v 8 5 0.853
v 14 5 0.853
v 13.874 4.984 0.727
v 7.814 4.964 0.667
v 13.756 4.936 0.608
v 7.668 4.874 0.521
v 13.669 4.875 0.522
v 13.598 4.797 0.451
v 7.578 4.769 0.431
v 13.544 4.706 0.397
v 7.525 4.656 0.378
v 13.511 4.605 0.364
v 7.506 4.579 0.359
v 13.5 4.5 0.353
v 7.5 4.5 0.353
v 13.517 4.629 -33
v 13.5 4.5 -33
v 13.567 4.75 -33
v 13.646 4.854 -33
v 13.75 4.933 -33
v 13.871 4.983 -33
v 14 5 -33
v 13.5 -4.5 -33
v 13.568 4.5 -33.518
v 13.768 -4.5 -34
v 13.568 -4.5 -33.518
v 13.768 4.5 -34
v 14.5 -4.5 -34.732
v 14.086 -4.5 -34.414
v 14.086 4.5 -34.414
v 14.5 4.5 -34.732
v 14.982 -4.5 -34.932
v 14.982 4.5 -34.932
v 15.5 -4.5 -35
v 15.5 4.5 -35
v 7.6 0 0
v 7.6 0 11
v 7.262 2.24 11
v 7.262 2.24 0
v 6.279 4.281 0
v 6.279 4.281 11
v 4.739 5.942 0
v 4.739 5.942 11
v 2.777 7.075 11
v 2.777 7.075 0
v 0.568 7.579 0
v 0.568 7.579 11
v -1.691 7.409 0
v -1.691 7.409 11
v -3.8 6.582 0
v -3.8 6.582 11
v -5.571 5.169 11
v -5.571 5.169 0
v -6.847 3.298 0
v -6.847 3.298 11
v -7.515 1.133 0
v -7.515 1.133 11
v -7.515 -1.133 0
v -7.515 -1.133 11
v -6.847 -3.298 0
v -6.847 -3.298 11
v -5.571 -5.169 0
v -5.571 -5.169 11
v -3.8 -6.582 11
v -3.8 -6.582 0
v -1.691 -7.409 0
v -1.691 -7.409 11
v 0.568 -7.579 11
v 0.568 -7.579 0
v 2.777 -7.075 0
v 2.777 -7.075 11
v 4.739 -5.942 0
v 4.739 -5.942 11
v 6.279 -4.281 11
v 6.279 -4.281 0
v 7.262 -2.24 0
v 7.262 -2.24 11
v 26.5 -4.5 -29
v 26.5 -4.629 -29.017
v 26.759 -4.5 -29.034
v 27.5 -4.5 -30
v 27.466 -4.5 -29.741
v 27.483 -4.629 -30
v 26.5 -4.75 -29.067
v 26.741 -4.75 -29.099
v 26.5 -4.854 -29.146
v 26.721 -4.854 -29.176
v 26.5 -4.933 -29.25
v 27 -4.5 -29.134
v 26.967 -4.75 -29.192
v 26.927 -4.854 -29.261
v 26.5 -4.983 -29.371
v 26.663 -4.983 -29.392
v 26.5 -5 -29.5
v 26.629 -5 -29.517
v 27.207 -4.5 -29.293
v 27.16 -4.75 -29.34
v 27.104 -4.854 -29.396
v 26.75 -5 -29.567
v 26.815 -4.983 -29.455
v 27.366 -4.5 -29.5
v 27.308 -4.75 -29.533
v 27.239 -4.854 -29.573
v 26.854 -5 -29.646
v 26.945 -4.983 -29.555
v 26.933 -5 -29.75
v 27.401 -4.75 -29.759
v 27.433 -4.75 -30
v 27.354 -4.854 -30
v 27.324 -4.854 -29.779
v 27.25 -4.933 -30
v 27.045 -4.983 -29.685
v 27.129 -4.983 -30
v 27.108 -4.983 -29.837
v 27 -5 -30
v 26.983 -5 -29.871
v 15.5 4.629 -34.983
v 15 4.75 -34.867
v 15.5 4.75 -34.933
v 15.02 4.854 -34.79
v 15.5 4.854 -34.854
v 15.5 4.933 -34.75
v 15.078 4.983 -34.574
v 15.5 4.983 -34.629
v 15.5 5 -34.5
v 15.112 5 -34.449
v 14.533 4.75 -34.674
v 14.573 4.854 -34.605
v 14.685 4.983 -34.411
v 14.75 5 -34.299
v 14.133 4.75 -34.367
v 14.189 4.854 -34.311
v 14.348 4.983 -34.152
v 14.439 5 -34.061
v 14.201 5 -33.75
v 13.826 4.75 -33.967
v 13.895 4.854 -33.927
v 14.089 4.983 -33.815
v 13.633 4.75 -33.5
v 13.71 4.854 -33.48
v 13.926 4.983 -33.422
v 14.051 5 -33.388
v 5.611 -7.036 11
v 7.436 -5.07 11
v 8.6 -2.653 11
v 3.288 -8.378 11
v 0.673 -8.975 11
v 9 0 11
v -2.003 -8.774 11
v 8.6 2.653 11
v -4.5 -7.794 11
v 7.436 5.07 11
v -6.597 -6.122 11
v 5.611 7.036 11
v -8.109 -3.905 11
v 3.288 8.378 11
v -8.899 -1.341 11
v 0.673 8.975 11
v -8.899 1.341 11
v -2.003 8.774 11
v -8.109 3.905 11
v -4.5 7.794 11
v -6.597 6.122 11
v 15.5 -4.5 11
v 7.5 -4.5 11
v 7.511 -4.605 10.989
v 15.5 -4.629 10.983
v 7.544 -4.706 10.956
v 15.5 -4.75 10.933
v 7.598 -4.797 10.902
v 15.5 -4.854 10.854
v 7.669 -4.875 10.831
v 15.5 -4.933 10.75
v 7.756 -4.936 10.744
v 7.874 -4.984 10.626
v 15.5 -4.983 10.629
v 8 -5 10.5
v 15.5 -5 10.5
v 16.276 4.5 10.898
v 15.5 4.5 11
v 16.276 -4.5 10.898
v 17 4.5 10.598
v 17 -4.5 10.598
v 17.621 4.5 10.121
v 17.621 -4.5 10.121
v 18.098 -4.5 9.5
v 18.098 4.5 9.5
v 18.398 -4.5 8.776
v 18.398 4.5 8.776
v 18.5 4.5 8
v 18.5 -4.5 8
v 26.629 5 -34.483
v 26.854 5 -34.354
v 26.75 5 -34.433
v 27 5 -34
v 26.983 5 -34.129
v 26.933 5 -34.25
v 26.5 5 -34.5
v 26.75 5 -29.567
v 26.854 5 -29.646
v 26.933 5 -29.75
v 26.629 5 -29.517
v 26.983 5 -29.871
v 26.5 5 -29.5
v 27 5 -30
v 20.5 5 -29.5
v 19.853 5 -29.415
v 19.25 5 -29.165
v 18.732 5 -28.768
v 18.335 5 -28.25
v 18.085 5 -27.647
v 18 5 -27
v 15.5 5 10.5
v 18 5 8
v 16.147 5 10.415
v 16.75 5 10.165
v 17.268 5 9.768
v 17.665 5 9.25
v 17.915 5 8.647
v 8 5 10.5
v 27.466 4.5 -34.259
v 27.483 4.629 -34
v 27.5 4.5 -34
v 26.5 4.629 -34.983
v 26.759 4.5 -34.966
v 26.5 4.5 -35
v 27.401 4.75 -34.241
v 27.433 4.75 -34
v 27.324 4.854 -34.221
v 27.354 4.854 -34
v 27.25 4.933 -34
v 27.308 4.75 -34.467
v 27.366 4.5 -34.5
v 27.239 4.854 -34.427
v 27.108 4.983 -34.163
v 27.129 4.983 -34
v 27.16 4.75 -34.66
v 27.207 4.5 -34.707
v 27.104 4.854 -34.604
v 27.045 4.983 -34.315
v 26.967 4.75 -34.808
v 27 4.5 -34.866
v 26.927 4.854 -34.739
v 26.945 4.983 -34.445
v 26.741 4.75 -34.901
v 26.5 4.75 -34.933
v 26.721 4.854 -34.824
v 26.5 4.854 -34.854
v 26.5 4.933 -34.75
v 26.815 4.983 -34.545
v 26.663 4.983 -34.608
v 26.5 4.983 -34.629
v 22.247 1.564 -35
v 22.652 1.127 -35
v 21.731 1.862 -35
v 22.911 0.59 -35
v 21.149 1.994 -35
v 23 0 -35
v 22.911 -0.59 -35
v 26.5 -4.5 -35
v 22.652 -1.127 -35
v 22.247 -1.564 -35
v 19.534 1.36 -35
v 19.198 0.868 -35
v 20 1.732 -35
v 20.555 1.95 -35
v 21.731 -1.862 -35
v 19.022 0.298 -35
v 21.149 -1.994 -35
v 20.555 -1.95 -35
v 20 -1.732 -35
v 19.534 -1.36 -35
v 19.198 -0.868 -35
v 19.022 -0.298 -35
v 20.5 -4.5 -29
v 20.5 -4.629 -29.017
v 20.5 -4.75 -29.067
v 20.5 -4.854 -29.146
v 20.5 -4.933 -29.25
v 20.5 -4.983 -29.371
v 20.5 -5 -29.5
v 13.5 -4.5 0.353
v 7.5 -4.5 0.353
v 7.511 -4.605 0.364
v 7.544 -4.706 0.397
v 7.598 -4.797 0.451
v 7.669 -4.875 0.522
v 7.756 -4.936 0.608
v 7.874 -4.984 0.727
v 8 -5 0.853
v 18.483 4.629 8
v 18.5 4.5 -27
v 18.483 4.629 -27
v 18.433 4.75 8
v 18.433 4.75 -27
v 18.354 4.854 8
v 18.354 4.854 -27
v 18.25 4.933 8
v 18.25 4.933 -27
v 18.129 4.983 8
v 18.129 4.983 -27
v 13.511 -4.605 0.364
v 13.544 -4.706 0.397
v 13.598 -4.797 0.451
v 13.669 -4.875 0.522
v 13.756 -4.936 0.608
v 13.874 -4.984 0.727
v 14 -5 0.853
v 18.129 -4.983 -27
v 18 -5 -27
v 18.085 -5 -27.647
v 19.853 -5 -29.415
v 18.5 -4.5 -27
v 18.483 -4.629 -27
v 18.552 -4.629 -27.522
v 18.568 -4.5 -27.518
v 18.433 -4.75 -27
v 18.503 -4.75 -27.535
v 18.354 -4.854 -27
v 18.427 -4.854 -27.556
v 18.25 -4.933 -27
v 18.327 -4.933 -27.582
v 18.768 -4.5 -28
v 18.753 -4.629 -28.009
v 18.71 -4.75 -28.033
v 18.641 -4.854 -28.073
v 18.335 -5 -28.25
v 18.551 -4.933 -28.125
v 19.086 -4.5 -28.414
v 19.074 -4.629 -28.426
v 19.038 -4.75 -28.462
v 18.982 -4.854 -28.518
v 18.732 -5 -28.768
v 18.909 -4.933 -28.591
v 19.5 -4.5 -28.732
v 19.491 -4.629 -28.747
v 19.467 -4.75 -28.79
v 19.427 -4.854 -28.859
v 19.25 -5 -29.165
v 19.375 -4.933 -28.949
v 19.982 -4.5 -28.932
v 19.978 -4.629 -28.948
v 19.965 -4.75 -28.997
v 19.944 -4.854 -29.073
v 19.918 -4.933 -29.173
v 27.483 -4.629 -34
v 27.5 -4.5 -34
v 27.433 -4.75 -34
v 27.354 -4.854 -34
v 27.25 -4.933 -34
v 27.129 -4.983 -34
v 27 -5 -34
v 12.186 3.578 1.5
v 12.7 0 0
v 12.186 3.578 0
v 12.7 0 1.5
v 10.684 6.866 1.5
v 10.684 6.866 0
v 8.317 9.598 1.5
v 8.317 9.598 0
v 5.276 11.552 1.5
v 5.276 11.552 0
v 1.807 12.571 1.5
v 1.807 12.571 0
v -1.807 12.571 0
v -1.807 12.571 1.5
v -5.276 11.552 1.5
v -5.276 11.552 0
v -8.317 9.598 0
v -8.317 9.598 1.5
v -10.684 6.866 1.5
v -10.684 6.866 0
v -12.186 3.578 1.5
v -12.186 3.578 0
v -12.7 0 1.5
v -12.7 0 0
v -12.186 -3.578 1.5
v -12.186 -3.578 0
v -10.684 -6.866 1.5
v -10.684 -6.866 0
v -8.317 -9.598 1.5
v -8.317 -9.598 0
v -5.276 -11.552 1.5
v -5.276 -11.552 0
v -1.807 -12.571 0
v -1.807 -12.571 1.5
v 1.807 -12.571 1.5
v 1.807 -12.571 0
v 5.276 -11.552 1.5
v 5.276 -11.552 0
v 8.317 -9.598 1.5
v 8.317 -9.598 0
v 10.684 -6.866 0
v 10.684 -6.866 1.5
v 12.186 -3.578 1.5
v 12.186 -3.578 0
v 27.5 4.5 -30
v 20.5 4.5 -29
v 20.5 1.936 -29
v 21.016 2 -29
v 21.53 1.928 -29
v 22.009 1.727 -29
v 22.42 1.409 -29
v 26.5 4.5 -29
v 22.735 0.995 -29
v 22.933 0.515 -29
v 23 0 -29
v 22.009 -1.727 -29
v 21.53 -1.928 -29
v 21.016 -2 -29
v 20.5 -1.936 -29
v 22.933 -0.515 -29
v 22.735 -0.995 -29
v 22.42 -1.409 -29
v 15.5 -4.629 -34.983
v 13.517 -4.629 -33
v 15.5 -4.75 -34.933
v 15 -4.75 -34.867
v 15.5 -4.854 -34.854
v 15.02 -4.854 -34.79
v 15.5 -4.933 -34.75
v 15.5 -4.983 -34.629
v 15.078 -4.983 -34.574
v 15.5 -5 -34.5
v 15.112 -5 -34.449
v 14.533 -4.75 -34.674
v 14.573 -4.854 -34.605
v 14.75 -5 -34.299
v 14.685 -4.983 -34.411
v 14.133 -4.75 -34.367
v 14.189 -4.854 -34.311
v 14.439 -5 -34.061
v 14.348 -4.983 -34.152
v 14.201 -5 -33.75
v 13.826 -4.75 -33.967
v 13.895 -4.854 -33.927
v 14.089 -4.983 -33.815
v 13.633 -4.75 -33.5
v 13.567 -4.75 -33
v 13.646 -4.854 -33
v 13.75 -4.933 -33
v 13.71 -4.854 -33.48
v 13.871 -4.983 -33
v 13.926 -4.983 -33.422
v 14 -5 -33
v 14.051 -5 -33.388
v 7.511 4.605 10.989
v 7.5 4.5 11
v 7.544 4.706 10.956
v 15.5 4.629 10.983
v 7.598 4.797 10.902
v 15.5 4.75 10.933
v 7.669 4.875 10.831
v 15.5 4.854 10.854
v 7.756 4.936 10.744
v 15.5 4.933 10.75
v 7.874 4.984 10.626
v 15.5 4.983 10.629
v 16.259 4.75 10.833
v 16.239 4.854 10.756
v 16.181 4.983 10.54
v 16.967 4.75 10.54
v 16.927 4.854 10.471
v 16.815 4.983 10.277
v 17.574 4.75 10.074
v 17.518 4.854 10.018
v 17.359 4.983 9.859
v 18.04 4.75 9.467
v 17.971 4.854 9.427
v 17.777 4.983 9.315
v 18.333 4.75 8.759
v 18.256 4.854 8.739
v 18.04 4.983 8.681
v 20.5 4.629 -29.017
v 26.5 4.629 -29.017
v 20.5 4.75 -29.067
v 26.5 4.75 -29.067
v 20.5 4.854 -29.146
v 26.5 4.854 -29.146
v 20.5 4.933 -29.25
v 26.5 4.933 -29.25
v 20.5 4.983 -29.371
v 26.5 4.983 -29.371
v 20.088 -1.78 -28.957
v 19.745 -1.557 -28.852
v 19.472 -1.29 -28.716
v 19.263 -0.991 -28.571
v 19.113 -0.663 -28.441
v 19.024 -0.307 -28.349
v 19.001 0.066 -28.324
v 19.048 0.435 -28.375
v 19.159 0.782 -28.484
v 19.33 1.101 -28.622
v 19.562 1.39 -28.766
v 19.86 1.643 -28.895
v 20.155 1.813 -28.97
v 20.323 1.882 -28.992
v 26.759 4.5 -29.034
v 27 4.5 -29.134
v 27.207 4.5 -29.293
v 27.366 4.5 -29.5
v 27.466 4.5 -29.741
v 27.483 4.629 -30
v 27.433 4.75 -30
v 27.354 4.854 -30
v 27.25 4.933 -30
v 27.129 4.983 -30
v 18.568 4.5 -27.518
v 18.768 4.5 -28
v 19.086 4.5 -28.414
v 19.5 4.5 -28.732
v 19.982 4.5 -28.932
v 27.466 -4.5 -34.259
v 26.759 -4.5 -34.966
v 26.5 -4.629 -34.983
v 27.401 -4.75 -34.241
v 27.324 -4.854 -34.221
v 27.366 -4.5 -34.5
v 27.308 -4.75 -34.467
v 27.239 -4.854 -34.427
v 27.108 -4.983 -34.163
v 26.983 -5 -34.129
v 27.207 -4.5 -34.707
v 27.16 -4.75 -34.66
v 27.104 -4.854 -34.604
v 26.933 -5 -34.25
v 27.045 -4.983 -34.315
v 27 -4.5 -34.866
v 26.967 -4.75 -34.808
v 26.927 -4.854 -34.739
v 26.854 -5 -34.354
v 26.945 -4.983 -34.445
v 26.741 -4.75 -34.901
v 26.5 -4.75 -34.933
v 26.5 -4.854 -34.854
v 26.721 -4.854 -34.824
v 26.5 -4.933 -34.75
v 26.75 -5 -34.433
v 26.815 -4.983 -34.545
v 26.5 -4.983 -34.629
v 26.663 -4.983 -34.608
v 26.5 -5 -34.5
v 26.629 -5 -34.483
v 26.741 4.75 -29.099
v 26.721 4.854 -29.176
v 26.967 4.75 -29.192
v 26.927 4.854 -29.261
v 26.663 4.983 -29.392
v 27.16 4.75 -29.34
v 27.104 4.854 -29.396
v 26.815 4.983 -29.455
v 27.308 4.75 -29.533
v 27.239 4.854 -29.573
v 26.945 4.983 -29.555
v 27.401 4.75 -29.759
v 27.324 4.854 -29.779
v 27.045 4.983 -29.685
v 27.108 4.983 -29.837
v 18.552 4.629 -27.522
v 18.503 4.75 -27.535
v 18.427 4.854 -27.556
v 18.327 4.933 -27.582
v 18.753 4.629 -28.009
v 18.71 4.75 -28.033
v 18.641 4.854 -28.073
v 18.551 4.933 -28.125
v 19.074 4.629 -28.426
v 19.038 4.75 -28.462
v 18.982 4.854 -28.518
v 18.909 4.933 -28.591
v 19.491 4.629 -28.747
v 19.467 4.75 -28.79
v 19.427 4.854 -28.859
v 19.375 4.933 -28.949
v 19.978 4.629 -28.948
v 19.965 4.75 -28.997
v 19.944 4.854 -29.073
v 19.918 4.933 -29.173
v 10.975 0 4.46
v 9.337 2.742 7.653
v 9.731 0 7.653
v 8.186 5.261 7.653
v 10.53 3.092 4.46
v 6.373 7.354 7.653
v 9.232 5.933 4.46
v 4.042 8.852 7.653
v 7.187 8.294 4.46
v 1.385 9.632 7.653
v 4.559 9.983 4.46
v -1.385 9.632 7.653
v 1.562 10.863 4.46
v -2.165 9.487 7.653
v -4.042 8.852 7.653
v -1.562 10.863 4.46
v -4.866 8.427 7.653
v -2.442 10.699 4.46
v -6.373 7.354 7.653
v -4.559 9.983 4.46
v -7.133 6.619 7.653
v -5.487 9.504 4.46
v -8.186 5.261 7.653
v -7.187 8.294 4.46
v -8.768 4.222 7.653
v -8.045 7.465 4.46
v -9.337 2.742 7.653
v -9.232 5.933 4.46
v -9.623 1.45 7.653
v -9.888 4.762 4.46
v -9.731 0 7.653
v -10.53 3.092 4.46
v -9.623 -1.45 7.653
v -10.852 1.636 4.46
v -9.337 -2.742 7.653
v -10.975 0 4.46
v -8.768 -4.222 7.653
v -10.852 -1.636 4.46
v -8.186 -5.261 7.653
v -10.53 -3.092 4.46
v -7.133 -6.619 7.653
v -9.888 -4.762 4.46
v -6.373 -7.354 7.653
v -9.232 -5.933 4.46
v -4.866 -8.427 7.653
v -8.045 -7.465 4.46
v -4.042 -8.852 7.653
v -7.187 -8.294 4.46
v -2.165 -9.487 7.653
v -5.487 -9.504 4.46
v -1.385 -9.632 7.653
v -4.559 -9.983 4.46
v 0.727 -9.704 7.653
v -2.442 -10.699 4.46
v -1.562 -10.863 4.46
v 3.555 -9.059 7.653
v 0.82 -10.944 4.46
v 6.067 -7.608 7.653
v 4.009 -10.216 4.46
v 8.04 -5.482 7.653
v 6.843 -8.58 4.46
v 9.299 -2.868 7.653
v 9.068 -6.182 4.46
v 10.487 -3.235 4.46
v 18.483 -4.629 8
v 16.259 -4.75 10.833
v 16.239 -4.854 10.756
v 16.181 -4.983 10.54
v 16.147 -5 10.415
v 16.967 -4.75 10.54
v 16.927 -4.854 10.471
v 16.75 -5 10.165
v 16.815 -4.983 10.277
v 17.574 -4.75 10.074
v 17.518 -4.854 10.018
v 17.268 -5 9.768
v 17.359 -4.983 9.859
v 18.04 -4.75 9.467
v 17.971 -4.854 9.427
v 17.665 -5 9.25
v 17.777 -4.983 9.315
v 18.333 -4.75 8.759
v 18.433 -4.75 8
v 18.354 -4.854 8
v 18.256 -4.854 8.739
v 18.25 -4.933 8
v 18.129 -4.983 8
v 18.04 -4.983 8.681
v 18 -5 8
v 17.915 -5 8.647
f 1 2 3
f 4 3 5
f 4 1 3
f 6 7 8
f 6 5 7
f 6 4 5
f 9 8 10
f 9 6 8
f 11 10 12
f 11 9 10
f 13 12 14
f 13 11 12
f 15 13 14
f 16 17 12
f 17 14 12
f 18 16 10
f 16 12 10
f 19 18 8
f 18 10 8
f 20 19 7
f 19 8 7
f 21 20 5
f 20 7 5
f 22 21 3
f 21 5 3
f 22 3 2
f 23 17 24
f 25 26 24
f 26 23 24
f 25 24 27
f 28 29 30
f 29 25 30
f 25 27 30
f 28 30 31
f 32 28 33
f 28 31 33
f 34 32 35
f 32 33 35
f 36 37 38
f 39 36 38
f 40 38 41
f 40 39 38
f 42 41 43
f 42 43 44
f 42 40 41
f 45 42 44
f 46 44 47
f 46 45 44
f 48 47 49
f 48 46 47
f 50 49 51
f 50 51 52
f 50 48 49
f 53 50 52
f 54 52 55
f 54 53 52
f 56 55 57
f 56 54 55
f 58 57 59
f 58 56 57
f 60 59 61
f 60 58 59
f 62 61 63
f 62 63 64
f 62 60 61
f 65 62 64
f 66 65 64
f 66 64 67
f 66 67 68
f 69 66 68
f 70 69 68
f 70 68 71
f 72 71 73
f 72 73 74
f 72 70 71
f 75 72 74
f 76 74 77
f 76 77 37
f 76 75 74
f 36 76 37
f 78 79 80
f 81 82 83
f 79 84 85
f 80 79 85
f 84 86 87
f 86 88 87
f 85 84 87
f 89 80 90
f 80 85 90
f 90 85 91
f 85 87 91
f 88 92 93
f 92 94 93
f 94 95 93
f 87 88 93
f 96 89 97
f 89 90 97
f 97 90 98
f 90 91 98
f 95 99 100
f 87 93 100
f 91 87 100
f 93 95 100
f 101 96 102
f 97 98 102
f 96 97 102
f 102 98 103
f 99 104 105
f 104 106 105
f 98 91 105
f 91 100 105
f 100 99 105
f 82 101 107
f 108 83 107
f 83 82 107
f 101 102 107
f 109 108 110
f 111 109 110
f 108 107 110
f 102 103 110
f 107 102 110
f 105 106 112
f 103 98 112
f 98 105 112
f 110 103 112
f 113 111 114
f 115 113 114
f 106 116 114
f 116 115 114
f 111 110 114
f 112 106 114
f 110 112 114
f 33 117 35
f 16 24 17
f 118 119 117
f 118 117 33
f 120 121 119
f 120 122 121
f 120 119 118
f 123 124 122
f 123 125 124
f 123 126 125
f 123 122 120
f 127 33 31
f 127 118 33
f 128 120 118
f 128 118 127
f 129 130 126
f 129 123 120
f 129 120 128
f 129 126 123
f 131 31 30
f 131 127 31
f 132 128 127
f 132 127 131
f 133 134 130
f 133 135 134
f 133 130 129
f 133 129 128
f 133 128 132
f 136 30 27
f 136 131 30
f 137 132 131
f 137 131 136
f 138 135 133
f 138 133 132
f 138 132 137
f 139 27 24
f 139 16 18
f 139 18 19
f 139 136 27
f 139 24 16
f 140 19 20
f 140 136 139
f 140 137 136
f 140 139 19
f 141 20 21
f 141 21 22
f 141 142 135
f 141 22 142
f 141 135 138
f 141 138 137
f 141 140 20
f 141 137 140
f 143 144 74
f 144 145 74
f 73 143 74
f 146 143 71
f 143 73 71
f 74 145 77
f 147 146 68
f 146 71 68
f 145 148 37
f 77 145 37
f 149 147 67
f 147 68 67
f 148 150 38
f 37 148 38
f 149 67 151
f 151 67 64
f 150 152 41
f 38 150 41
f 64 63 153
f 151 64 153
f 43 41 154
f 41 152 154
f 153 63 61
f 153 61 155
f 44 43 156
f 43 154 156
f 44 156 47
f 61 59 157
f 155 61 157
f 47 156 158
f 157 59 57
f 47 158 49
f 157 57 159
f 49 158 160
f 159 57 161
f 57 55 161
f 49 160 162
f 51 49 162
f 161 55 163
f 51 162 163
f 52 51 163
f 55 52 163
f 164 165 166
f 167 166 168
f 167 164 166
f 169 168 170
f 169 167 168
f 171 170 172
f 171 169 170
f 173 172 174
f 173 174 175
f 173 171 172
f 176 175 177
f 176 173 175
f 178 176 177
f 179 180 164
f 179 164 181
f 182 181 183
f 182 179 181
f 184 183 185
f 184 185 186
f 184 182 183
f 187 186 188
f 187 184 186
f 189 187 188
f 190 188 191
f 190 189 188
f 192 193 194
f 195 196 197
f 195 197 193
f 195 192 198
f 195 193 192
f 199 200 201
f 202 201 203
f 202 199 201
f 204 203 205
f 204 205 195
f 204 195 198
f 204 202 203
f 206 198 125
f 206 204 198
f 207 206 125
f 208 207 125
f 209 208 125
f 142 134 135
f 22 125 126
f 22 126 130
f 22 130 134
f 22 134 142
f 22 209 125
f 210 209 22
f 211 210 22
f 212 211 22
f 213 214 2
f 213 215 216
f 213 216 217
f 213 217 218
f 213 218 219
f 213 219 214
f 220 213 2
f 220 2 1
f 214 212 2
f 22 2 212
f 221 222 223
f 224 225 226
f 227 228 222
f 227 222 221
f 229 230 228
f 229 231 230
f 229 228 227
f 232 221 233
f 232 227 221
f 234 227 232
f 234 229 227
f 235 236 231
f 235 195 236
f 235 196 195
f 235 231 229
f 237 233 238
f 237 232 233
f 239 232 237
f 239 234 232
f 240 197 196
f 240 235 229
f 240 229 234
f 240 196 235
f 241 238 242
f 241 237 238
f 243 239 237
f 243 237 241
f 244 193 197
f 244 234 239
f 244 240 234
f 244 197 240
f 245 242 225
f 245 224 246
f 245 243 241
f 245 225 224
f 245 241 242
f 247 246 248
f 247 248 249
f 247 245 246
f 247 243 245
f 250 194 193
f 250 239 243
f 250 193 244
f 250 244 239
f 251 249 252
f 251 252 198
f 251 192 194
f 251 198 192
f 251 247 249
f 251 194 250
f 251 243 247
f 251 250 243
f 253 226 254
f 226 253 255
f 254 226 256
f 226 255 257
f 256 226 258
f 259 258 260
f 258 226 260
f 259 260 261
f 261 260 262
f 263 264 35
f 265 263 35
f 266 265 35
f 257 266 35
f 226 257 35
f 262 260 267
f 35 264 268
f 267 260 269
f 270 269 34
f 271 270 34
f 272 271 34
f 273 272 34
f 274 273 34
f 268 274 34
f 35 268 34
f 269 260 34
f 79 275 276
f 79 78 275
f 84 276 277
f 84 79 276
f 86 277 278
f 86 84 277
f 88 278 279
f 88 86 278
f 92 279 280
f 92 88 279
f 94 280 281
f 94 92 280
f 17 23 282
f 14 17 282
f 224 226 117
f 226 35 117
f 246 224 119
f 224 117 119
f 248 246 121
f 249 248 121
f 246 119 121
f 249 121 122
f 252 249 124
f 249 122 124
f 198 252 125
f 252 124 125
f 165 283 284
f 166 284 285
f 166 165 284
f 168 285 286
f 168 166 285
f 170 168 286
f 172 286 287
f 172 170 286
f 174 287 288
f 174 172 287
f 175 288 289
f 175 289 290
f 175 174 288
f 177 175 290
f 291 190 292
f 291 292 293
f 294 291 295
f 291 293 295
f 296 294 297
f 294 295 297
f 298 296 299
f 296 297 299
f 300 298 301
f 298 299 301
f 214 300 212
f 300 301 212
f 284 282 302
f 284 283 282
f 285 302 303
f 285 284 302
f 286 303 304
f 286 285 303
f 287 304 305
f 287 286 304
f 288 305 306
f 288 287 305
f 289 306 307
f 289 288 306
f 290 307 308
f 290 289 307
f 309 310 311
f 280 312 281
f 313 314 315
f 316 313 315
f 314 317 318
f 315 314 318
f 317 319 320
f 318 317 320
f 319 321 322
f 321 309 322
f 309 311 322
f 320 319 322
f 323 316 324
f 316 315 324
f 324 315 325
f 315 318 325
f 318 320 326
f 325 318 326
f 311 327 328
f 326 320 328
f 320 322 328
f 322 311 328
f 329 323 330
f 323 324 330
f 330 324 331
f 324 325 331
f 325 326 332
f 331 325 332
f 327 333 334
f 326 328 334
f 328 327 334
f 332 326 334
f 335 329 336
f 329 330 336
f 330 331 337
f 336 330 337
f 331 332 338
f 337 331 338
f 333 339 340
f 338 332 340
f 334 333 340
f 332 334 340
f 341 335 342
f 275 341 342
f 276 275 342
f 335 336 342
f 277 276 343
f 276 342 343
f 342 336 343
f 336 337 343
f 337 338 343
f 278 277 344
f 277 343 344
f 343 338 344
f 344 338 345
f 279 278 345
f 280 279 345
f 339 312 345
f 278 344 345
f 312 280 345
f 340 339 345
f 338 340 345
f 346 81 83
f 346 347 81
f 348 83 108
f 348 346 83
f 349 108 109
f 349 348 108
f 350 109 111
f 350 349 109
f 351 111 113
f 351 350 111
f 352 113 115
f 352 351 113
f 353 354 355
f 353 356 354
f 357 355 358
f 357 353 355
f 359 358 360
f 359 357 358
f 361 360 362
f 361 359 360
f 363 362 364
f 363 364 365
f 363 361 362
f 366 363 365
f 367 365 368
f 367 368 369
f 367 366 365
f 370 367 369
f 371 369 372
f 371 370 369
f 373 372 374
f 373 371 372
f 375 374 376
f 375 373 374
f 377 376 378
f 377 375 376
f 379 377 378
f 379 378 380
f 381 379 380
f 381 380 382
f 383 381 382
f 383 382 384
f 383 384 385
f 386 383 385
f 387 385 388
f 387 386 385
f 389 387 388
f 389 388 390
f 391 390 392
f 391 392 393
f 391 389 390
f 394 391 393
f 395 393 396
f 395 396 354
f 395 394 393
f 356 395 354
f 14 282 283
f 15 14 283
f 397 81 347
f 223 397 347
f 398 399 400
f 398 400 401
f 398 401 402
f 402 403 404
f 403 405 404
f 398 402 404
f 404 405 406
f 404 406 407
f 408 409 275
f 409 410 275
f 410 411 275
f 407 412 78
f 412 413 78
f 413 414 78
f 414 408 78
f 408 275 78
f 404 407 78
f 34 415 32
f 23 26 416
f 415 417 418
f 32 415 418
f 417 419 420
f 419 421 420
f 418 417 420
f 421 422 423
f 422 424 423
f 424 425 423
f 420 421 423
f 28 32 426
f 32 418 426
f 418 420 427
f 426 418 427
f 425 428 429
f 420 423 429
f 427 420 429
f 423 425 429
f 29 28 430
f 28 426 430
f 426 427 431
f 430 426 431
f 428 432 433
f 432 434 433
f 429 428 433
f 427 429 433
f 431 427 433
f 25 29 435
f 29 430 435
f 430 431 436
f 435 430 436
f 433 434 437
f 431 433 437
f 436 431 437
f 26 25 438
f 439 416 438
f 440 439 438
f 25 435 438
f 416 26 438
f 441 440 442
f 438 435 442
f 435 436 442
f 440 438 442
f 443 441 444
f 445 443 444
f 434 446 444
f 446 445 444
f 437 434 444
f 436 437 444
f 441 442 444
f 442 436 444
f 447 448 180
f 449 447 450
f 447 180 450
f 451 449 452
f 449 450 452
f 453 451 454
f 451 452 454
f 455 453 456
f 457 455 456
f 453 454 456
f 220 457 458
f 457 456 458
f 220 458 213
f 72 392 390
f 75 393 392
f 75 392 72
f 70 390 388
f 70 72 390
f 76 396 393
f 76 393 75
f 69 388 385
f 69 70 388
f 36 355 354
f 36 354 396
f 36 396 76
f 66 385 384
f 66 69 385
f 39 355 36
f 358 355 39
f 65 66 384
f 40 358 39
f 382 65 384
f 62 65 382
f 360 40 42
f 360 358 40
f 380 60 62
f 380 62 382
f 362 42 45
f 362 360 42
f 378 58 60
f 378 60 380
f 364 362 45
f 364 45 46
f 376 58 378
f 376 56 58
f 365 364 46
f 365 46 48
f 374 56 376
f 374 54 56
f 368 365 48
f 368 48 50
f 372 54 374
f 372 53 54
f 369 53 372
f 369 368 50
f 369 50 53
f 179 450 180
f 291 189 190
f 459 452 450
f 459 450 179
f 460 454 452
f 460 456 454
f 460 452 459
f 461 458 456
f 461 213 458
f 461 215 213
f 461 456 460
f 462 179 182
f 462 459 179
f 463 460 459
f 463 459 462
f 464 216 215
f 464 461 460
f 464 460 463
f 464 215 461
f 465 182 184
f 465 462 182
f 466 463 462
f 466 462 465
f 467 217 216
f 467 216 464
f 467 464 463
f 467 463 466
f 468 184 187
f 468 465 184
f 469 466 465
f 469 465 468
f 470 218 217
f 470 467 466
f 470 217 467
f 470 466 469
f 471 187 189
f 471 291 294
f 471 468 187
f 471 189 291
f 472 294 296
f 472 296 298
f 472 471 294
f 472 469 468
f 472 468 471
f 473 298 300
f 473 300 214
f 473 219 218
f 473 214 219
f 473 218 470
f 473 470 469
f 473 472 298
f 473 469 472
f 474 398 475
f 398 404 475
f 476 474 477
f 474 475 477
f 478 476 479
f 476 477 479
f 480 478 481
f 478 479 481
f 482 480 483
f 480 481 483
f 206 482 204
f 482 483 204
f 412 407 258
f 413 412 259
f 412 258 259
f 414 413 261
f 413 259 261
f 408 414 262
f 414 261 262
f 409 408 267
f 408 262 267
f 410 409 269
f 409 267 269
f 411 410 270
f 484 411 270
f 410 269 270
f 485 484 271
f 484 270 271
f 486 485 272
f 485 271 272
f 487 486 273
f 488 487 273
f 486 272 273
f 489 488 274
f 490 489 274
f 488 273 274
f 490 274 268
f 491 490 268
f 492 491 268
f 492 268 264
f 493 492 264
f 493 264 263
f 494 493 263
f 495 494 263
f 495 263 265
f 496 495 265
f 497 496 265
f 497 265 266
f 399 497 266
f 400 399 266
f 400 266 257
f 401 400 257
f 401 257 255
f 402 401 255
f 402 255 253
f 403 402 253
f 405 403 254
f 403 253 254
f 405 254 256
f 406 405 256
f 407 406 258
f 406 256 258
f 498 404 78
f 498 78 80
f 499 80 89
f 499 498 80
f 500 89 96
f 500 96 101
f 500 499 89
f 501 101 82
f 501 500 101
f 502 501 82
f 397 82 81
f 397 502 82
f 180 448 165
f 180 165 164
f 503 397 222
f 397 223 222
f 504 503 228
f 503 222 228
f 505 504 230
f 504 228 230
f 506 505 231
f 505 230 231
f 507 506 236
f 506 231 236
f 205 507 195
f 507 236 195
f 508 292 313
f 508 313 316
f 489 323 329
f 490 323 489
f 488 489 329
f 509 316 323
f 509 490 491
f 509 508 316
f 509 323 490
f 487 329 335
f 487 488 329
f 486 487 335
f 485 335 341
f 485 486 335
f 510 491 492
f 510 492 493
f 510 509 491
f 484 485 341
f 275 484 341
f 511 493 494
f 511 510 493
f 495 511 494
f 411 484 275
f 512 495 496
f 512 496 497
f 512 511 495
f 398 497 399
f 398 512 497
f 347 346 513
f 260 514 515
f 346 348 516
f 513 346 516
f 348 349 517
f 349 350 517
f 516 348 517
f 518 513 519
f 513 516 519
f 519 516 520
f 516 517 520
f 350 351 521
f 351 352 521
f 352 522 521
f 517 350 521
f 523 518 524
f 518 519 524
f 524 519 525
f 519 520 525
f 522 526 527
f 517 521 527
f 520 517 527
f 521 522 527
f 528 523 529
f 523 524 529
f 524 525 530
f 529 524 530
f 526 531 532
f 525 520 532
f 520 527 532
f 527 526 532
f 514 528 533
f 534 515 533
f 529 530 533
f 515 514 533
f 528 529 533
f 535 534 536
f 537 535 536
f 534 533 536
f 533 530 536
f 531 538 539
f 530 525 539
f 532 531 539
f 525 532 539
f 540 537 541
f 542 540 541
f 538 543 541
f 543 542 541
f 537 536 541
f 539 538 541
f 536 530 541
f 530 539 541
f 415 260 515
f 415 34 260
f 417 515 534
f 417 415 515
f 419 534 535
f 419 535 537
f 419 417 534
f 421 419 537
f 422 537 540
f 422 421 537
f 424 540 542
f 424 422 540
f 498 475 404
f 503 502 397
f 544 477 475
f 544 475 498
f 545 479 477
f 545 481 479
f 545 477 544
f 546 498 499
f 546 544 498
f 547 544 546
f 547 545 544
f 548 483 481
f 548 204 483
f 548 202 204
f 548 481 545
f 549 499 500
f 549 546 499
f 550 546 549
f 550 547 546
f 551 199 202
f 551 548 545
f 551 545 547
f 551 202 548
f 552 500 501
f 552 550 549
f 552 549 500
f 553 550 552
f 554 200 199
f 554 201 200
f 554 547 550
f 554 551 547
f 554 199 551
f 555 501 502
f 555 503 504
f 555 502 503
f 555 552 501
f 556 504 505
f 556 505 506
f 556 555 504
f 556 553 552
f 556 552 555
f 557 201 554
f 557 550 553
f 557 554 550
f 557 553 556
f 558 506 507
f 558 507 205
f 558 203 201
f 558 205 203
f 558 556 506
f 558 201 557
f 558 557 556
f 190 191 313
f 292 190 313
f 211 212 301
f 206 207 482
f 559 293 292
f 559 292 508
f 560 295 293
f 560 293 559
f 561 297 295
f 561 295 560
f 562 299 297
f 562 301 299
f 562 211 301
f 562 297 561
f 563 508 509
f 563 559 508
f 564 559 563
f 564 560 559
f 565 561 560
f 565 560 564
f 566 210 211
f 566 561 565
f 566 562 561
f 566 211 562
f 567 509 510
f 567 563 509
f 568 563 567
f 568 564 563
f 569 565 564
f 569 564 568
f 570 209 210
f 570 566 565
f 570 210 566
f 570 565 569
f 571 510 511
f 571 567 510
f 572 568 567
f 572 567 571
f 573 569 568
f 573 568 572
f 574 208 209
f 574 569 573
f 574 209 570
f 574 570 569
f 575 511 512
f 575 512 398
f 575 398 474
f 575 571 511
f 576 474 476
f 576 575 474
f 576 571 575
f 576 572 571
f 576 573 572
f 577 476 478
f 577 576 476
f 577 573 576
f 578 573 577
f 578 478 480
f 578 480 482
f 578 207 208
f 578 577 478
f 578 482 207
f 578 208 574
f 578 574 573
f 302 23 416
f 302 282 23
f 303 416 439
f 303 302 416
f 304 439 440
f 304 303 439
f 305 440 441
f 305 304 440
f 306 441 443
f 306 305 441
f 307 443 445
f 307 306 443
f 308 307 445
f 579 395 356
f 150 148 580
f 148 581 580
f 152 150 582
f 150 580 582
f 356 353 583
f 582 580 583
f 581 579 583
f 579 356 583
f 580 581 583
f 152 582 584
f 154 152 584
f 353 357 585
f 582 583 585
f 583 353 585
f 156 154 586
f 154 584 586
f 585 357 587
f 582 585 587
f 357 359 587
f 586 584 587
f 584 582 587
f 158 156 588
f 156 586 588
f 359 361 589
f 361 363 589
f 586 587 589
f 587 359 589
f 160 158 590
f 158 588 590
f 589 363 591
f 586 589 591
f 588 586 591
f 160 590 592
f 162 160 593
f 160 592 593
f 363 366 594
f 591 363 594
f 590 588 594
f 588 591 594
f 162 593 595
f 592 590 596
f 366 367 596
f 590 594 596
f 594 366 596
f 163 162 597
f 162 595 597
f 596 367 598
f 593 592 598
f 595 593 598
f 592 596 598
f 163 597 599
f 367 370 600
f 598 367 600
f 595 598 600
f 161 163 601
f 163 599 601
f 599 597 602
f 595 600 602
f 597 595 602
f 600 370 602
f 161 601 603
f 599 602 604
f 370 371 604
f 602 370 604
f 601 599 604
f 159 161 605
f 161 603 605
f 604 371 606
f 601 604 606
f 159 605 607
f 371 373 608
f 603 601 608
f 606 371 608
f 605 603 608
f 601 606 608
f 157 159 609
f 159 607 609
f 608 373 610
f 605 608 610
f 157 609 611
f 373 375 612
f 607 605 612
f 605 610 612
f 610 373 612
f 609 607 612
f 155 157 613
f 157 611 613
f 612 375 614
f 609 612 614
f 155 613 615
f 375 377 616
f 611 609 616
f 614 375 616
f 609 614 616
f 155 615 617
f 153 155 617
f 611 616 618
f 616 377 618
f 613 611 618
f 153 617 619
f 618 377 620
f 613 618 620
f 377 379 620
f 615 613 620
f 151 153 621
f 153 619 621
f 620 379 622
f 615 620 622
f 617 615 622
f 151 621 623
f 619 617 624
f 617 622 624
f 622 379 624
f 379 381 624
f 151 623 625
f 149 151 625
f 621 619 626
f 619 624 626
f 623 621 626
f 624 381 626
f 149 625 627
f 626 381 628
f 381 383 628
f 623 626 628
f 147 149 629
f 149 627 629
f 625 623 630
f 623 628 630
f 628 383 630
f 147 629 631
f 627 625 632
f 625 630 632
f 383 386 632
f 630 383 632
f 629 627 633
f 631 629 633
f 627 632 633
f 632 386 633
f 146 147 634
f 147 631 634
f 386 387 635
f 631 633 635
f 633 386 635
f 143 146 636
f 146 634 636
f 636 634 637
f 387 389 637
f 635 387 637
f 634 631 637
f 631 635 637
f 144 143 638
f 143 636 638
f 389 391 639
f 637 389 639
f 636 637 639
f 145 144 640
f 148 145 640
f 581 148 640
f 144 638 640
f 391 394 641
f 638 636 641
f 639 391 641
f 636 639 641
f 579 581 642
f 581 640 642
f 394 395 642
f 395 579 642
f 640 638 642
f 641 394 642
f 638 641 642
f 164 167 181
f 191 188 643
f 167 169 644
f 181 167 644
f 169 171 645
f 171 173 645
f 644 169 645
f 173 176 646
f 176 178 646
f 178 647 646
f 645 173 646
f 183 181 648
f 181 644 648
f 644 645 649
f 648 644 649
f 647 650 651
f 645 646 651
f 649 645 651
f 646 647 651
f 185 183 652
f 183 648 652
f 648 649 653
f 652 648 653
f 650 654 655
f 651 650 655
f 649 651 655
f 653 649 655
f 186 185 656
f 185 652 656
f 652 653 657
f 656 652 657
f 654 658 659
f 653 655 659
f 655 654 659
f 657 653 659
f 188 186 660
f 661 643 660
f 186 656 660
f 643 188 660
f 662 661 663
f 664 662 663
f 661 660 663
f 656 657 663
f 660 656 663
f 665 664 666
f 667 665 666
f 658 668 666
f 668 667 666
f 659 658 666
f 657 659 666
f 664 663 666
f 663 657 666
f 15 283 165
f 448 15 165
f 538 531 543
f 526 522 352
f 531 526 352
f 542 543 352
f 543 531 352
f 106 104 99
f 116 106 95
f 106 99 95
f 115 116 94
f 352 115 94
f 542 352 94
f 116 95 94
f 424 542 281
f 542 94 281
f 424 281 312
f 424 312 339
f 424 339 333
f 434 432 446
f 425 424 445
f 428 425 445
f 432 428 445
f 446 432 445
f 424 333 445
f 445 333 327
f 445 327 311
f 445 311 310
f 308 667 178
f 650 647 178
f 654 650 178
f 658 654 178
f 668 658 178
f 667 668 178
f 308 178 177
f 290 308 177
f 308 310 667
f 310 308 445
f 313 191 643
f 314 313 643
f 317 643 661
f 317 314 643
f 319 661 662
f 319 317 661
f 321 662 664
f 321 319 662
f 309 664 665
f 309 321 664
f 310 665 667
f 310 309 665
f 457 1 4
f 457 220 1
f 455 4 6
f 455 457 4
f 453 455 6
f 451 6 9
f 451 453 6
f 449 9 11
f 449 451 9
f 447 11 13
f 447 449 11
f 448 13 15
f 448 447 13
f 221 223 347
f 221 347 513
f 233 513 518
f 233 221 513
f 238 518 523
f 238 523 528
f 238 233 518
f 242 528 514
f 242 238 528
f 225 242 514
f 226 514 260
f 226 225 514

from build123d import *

# Parameters (mm, degrees)
PAD_DEPTH    = 5
FILLET_R     = 3
FILLET001_R  = 2
FILLET002_R  = 1
FILLET003_R  = 0.5
FILLET004_R  = 0.5
SKETCH_R     = 2
POCKET_DEPTH = 46.001


with BuildPart() as revolution:
    # Sketch002 → Revolution (revolve)
    with BuildSketch(Plane.XZ):
        with BuildLine():
            Line((7.6, 11), (7.6, 0))
            Line((7.6, 0), (12.7, 0))
            Line((12.7, 0), (12.7, 1.5))
            ThreePointArc((9, 11), (10.290513, 6.032095), (12.7, 1.5))
            Line((7.6, 11), (9, 11))
        make_face()
    revolve(axis=Axis((0, 0, 0), (0, 0, 1)))


with BuildPart() as pocket:
    # Sketch003 → Pad (new body, symmetric)
    with BuildSketch(Plane.XZ):
        Polygon((7.5, 11), (18.5, 11), (18.5, -29), (27.5, -29), (27.5, -35), (13.5, -35), (13.5, 0.352804), (7.5, 0.352804), align=None)
    extrude(amount=PAD_DEPTH, both=True)

    # Fillet
    fillet_edges = [pocket.edges().sort_by_distance(p)[0] for p in [
        (18.5, 0, 11),
    ]]
    fillet(fillet_edges, radius=FILLET_R)

    # Fillet001
    fillet001_edges = [pocket.edges().sort_by_distance(p)[0] for p in [
        (13.5, 0, -35),
        (18.5, 0, -29),
    ]]
    fillet(fillet001_edges, radius=FILLET001_R)

    # Fillet002
    fillet002_edges = [pocket.edges().sort_by_distance(p)[0] for p in [
        (27.5, 0, -29),
        (27.5, 0, -35),
    ]]
    fillet(fillet002_edges, radius=FILLET002_R)

    # Fillet003
    fillet003_edges = [pocket.edges().sort_by_distance(p)[0] for p in [
        (23.5, -5, -29),
        (27.207107, -5, -29.292893),
        (19.085786, -5, -28.414214),
        (27.5, -5, -32),
        (18.5, -5, -9.5),
        (27.207107, -5, -34.707107),
        (17.62132, -5, 10.12132),
        (21, -5, -35),
        (11.5, -5, 11),
        (14.085786, -5, -34.414214),
        (7.5, -5, 5.676402),
        (13.5, -5, -16.323598),
        (10.5, -5, 0.352804),
    ]]
    fillet(fillet003_edges, radius=FILLET003_R)

    # Fillet004
    fillet004_edges = [pocket.edges().sort_by_distance(p)[0] for p in [
        (23.5, 5, -29),
        (27.207107, 5, -29.292893),
        (19.085786, 5, -28.414214),
        (27.5, 5, -32),
        (18.5, 5, -9.5),
        (27.207107, 5, -34.707107),
        (17.62132, 5, 10.12132),
        (21, 5, -35),
        (11.5, 5, 11),
        (14.085786, 5, -34.414214),
        (7.5, 5, 5.676402),
        (13.5, 5, -16.323598),
        (10.5, 5, 0.352804),
    ]]
    fillet(fillet004_edges, radius=FILLET004_R)

    # Sketch → Pocket (cut, through all)
    with BuildSketch(Plane(origin=(0, 0, -35), x_dir=(1, 0, 0), z_dir=(0, 0, -1))):
        with Locations((21, 0)):
            Circle(SKETCH_R)
    extrude(amount=-POCKET_DEPTH, mode=Mode.SUBTRACT)


solid = Compound([revolution.part, pocket.part])
